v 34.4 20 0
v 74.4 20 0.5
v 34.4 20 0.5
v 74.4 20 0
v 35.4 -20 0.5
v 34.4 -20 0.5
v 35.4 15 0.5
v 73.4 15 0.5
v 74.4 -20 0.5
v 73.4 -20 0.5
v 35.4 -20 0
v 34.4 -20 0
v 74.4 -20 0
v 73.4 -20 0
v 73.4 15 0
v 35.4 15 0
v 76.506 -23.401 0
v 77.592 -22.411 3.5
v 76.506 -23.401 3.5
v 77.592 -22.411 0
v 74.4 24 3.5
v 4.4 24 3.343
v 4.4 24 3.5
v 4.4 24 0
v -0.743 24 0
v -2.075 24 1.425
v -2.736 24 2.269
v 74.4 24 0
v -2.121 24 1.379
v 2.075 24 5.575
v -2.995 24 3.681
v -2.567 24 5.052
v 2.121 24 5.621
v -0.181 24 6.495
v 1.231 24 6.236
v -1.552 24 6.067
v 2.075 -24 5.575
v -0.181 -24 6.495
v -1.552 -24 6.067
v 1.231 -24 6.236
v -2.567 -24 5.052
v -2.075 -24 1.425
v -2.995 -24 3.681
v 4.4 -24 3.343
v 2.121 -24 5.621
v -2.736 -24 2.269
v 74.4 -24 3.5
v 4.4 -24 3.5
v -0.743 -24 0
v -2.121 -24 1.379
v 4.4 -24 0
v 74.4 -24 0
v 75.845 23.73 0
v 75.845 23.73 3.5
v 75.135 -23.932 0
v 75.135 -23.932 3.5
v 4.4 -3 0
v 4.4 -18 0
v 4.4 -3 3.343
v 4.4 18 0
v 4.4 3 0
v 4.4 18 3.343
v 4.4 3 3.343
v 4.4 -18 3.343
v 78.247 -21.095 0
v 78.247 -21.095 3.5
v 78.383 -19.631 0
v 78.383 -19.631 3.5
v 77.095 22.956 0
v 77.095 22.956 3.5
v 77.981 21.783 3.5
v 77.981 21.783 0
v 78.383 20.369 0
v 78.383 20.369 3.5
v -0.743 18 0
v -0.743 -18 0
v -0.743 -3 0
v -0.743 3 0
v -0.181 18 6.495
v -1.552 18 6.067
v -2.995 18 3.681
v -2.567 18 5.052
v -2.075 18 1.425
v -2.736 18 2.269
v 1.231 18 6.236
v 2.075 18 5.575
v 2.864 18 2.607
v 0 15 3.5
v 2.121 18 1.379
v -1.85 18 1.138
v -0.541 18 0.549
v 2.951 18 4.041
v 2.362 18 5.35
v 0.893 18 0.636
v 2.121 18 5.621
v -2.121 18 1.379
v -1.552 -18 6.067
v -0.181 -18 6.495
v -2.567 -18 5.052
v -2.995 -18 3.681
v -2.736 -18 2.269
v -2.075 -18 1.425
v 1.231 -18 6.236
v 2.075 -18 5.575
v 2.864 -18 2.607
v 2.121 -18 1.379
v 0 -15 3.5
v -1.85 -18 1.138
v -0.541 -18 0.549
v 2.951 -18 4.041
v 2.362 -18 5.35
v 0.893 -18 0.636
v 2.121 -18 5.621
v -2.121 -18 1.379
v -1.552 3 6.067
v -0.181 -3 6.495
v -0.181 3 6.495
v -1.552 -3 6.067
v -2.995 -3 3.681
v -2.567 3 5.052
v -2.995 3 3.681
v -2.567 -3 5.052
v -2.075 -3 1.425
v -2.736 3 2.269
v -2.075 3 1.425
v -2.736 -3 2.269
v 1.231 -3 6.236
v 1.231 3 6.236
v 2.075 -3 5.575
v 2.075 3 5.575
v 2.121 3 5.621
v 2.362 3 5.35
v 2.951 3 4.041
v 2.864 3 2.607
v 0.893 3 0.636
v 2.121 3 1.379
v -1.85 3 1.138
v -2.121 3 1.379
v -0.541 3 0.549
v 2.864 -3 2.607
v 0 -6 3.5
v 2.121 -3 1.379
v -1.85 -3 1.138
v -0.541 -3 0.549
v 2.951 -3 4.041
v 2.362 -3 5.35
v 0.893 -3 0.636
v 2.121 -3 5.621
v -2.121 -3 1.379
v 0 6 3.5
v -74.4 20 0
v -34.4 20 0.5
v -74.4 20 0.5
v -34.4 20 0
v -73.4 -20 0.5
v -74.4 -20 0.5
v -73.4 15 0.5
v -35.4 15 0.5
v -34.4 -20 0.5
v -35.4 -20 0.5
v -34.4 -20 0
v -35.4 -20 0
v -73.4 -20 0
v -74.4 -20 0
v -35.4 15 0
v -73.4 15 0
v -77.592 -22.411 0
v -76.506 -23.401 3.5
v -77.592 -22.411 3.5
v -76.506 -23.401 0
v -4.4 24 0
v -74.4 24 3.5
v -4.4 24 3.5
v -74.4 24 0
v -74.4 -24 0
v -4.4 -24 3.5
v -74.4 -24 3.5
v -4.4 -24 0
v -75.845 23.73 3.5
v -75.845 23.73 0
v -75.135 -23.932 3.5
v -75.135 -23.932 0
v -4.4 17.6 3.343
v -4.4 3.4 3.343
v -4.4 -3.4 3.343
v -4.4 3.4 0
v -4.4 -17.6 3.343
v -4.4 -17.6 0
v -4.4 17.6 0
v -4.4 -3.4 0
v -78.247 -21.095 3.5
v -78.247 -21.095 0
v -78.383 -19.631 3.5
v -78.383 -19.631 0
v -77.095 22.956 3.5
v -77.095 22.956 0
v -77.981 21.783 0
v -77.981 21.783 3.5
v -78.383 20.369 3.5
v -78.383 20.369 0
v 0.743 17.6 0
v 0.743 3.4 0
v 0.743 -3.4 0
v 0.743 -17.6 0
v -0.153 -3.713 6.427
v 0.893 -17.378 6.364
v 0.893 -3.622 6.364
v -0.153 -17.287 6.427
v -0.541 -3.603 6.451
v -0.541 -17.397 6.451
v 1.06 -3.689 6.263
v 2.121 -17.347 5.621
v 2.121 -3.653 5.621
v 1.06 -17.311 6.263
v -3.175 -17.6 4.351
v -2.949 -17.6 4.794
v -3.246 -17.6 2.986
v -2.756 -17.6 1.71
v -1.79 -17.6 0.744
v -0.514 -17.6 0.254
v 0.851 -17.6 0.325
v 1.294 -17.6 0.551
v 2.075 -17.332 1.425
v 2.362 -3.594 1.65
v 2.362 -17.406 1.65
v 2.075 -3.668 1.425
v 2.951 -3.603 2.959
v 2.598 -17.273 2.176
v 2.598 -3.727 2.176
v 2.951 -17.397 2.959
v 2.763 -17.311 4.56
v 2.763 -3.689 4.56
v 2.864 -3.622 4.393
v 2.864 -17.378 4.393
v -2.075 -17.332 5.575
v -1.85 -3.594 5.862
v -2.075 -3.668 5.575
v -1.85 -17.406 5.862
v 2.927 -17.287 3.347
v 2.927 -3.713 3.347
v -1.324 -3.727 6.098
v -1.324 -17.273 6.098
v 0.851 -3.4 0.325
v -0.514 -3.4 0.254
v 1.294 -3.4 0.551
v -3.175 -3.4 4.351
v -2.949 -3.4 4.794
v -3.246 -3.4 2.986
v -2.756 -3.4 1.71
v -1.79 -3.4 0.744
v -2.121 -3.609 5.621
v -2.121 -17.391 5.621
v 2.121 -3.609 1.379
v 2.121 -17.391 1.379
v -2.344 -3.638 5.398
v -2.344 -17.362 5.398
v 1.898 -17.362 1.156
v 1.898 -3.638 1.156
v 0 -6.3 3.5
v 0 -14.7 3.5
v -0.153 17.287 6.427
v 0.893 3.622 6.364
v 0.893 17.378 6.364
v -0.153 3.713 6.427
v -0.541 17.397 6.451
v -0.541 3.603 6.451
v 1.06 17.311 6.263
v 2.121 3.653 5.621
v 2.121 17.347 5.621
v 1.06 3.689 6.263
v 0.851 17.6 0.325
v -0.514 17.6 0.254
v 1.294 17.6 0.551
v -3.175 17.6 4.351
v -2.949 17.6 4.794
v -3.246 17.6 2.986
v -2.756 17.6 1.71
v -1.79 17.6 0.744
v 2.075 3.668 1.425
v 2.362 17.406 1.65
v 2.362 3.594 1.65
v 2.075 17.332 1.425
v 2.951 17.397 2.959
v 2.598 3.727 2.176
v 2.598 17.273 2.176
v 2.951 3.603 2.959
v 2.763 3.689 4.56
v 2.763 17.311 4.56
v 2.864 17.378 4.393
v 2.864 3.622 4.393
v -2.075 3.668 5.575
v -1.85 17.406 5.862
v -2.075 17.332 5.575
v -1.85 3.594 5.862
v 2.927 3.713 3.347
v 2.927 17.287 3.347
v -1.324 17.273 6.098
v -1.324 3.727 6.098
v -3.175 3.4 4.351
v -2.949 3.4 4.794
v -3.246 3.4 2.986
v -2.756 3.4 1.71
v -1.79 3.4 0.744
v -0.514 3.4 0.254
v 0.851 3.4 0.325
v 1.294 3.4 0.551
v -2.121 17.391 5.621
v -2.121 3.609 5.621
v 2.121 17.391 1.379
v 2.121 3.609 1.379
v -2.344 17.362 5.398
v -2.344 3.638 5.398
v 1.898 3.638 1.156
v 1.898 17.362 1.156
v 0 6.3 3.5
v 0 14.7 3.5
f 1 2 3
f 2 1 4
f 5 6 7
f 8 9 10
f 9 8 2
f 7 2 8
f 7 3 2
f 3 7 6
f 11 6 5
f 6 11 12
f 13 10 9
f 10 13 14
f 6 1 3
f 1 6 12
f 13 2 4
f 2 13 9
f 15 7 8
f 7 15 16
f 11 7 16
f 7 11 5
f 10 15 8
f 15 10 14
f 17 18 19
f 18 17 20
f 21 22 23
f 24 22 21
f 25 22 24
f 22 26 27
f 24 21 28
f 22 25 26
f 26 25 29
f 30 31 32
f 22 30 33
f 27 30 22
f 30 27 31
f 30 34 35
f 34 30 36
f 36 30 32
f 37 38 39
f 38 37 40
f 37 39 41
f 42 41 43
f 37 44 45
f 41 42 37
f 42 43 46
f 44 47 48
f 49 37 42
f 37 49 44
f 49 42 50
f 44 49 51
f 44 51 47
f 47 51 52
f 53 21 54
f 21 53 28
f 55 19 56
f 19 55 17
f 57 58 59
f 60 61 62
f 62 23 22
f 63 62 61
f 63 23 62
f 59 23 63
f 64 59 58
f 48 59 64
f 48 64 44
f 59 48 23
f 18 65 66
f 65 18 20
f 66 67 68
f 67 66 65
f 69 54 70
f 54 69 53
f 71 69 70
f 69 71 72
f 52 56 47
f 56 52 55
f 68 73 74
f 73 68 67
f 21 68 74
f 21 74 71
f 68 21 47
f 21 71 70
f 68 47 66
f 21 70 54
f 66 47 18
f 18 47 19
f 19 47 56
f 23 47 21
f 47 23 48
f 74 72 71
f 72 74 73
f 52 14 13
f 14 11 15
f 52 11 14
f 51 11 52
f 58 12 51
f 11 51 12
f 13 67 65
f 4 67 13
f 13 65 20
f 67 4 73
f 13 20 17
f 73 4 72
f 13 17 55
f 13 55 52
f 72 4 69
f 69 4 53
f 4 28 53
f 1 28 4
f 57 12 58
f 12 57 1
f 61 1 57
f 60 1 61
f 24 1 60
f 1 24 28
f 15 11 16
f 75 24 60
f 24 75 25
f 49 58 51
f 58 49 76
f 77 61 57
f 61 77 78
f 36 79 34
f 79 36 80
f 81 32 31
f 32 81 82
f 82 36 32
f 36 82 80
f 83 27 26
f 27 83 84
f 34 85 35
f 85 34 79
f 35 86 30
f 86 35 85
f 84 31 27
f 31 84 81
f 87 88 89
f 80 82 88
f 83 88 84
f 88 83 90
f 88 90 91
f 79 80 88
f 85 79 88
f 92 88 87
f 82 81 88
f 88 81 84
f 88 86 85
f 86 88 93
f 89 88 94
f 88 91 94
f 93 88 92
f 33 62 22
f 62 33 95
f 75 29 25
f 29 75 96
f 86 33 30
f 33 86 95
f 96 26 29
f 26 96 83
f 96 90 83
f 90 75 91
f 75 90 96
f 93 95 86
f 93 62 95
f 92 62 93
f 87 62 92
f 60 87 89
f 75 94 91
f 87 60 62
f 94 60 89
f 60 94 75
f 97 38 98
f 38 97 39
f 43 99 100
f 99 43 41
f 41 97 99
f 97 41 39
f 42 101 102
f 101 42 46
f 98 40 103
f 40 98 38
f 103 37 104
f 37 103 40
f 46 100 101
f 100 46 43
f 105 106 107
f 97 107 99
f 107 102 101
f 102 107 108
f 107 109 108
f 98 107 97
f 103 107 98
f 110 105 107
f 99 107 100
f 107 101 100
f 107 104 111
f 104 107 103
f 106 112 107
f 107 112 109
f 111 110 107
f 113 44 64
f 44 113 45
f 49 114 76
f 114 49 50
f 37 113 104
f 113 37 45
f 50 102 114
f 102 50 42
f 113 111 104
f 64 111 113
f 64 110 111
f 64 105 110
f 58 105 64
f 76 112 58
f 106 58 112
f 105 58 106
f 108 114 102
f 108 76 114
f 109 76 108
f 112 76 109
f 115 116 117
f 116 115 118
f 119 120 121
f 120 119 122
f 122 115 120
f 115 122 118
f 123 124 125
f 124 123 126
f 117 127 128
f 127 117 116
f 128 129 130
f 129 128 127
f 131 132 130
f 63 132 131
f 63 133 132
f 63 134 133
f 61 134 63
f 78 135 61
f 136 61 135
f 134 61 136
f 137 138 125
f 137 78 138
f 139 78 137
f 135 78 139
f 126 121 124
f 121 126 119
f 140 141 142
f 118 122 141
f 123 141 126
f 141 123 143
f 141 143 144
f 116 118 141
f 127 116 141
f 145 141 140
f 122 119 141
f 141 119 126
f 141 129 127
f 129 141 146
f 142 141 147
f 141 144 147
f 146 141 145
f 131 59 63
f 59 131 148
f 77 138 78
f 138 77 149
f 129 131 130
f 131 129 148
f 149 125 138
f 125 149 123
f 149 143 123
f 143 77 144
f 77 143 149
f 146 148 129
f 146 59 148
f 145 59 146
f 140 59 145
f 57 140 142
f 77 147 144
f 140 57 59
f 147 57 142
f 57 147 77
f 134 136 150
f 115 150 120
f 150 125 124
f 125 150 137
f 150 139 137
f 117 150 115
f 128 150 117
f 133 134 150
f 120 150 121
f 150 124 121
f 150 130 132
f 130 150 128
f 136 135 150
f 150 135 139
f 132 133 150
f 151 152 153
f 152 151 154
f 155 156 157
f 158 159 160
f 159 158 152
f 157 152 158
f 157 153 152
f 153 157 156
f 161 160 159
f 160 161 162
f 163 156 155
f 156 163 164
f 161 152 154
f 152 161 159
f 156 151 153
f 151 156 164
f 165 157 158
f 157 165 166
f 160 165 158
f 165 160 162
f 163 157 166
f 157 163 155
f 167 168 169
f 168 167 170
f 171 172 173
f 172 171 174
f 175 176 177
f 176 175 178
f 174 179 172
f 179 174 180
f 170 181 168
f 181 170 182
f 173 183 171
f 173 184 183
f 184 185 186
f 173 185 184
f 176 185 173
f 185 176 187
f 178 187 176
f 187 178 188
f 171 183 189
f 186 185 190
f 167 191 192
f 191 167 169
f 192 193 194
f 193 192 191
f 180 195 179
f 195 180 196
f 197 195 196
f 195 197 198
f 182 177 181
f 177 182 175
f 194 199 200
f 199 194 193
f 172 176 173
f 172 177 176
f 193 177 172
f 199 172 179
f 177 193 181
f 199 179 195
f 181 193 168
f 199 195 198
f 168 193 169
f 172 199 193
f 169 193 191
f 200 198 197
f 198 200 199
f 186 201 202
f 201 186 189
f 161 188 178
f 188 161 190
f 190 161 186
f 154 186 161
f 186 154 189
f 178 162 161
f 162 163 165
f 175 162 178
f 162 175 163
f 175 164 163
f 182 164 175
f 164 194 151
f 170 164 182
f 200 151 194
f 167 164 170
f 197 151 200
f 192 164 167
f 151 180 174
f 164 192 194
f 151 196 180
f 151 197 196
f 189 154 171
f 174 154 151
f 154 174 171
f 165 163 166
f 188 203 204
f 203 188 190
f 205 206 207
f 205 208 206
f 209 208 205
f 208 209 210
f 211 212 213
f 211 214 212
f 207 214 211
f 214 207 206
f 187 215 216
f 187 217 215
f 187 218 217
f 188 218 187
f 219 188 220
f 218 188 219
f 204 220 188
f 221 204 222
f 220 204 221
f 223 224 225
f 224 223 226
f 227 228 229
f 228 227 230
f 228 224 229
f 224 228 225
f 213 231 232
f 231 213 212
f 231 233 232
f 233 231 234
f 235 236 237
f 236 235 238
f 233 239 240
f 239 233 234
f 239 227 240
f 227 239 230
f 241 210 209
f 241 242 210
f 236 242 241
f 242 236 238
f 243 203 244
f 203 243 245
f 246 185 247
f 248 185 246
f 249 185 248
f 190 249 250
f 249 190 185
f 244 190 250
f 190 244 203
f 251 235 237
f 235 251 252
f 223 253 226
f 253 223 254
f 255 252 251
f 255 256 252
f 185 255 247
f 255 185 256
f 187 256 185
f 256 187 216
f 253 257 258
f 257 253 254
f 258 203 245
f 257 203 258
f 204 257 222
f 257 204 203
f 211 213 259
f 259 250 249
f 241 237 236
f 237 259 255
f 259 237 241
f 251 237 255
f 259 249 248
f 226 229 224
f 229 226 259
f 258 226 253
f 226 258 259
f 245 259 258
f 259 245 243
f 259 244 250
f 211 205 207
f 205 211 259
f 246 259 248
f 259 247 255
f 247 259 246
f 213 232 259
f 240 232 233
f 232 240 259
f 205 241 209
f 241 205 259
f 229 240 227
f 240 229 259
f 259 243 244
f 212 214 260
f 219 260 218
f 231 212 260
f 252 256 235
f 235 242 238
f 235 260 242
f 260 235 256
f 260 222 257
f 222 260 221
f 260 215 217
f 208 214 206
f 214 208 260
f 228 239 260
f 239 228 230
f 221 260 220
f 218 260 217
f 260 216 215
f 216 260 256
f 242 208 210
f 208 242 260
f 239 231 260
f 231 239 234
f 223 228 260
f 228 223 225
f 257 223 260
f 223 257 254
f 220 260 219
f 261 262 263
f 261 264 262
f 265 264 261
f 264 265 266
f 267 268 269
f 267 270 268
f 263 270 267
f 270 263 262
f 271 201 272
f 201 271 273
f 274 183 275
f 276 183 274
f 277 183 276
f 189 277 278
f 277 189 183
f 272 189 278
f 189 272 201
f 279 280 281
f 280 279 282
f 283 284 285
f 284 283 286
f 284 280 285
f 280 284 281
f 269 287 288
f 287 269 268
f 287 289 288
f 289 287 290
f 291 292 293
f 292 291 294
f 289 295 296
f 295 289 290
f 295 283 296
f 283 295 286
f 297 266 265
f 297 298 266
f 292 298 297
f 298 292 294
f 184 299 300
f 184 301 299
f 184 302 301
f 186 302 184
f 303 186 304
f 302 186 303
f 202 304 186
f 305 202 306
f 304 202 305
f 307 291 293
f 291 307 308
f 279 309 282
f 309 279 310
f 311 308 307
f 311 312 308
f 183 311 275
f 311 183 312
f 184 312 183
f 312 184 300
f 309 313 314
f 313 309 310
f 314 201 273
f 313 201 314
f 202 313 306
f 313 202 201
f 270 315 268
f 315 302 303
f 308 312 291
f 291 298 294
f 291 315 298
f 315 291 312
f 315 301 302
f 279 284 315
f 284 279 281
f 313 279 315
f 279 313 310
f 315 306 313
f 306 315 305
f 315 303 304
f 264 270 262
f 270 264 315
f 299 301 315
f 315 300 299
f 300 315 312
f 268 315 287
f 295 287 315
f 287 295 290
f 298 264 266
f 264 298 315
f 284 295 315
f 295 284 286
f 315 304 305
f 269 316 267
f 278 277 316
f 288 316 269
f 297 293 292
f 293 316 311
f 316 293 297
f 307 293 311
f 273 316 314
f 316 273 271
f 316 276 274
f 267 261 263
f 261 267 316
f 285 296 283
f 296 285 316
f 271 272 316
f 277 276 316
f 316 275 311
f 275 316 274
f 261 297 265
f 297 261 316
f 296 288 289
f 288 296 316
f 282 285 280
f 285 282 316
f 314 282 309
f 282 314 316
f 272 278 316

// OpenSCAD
// preview[view:south, tilt:top];

// Simple photos with many shades of light/dark areas work best. Don't forget to click the Invert Colors checkbox!
image_file = ""; // [image_surface:100x100]



//Where would you like the hinge in relation to your image?
hinge_placement = 1; // [1:top,2:left,3:bottom,4:right]

//What height would you like for the embossed area (mm)?
emboss_height = 1.5;

/* [Hidden] */
$fa = 6;
$fs = 1.5;
image_width = 40;
image_length = 40;
image_padding = 4;

handle_width = image_width + image_padding*2;
handle_length = 70;
handle_height = emboss_height+2;
nub = 3; // hinge size
tol = 0.4; // spacing between hinge pieces

assembly();

module assembly() {
    stamp_top(90*hinge_placement);
    stamp_bottom(90*hinge_placement);   
}

module stamp_top(rot=90) {
    translate([1,0,0])
    union() {
        difference () {
          translate([handle_length + nub + tol, -handle_width/2, 0])
                rotate([0,0,90]) handle();
translate([handle_length-image_length/2+nub+tol,0,handle_height+0.4]) 
                rotate([0,180,rot]) plate();
	
 	            
        } 
   
        // hinge
        translate([-1,handle_width/2-2*nub,handle_height]) hinge_m();
        mirror([0,1,0]) translate([-1,handle_width/2-2*nub,handle_height]) hinge_m();
        translate([-1,-nub,handle_height]) hinge_m();
        mirror([0,1,0]) translate([-1,-nub,handle_height]) hinge_m();
    }
}

module stamp_bottom(rot=90) {
    translate([-1,0,0])
    union() {
        translate([-handle_length + image_length/2-nub-tol,0,handle_height]) 
            rotate([0,0,-rot]) plate();
        mirror([1,0,0]) translate([handle_length + nub + tol, -handle_width/2, 0]) 
            rotate([0,0,90]) handle();
        
        // hinge
        translate([1,-nub-tol,handle_height]) hinge_f();
        mirror([0,1,0]) translate([1,-nub-tol,handle_height]) hinge_f();
    }
}

module handle() {
    difference() {
        hull() {
            cube([handle_width, handle_length, handle_height]);
            translate([image_padding,0,0]) cylinder(r=image_padding, h=handle_height);
            translate([handle_width-image_padding,0,0]) cylinder(r=image_padding, h=handle_height);
        }
	guide();
    }

}

module guide() {
difference() {
translate([image_padding,0,-0.5]) 
        cube([image_width, image_length, 1]);	
translate([1,1,-0.5]) cube([image_width-2, image_length-2, 2]);    

        
}
}

module hinge_m() {
    difference () {
    	rotate([0,45,0]) union(){
            translate([0,0,-nub]) cube ([nub*3,nub*2, nub*2]);
            rotate([90,0,0]) {
                translate([0,0,-2*nub]) cylinder(r=nub,h=2*nub);
    		    cylinder(r1=nub,r2=0,h=nub);
            }
    	}
        translate([-nub,-nub/2,-handle_height-nub*5]) cube([nub*5, nub*3, nub*5]);
    }
}

module hinge_f() {
    len = handle_width/2 - 3*nub - 2*tol;
    
    difference() {
        rotate([90,-45,0]) 
        difference() {
            union() {
                cylinder(r=nub, h=len);
                translate([-3*nub,-nub,0]) cube([nub*3,nub*2,len]);
            }
            translate([0,0,-0.1]) cylinder(r1=nub+tol,r2=0,h=nub);
            translate([0,0,len-nub+0.1]) cylinder(r1=0,r2=nub+tol,h=nub);
        }
        translate([-nub*4,-len-nub/2,-handle_height-nub*5]) cube([nub*5, len+nub, nub*5]);
    }
}

module plate() {
    scale([(image_width)/100,(image_length)/100, emboss_height])
        surface(file=image_file, center=true, convexity=5);
}

